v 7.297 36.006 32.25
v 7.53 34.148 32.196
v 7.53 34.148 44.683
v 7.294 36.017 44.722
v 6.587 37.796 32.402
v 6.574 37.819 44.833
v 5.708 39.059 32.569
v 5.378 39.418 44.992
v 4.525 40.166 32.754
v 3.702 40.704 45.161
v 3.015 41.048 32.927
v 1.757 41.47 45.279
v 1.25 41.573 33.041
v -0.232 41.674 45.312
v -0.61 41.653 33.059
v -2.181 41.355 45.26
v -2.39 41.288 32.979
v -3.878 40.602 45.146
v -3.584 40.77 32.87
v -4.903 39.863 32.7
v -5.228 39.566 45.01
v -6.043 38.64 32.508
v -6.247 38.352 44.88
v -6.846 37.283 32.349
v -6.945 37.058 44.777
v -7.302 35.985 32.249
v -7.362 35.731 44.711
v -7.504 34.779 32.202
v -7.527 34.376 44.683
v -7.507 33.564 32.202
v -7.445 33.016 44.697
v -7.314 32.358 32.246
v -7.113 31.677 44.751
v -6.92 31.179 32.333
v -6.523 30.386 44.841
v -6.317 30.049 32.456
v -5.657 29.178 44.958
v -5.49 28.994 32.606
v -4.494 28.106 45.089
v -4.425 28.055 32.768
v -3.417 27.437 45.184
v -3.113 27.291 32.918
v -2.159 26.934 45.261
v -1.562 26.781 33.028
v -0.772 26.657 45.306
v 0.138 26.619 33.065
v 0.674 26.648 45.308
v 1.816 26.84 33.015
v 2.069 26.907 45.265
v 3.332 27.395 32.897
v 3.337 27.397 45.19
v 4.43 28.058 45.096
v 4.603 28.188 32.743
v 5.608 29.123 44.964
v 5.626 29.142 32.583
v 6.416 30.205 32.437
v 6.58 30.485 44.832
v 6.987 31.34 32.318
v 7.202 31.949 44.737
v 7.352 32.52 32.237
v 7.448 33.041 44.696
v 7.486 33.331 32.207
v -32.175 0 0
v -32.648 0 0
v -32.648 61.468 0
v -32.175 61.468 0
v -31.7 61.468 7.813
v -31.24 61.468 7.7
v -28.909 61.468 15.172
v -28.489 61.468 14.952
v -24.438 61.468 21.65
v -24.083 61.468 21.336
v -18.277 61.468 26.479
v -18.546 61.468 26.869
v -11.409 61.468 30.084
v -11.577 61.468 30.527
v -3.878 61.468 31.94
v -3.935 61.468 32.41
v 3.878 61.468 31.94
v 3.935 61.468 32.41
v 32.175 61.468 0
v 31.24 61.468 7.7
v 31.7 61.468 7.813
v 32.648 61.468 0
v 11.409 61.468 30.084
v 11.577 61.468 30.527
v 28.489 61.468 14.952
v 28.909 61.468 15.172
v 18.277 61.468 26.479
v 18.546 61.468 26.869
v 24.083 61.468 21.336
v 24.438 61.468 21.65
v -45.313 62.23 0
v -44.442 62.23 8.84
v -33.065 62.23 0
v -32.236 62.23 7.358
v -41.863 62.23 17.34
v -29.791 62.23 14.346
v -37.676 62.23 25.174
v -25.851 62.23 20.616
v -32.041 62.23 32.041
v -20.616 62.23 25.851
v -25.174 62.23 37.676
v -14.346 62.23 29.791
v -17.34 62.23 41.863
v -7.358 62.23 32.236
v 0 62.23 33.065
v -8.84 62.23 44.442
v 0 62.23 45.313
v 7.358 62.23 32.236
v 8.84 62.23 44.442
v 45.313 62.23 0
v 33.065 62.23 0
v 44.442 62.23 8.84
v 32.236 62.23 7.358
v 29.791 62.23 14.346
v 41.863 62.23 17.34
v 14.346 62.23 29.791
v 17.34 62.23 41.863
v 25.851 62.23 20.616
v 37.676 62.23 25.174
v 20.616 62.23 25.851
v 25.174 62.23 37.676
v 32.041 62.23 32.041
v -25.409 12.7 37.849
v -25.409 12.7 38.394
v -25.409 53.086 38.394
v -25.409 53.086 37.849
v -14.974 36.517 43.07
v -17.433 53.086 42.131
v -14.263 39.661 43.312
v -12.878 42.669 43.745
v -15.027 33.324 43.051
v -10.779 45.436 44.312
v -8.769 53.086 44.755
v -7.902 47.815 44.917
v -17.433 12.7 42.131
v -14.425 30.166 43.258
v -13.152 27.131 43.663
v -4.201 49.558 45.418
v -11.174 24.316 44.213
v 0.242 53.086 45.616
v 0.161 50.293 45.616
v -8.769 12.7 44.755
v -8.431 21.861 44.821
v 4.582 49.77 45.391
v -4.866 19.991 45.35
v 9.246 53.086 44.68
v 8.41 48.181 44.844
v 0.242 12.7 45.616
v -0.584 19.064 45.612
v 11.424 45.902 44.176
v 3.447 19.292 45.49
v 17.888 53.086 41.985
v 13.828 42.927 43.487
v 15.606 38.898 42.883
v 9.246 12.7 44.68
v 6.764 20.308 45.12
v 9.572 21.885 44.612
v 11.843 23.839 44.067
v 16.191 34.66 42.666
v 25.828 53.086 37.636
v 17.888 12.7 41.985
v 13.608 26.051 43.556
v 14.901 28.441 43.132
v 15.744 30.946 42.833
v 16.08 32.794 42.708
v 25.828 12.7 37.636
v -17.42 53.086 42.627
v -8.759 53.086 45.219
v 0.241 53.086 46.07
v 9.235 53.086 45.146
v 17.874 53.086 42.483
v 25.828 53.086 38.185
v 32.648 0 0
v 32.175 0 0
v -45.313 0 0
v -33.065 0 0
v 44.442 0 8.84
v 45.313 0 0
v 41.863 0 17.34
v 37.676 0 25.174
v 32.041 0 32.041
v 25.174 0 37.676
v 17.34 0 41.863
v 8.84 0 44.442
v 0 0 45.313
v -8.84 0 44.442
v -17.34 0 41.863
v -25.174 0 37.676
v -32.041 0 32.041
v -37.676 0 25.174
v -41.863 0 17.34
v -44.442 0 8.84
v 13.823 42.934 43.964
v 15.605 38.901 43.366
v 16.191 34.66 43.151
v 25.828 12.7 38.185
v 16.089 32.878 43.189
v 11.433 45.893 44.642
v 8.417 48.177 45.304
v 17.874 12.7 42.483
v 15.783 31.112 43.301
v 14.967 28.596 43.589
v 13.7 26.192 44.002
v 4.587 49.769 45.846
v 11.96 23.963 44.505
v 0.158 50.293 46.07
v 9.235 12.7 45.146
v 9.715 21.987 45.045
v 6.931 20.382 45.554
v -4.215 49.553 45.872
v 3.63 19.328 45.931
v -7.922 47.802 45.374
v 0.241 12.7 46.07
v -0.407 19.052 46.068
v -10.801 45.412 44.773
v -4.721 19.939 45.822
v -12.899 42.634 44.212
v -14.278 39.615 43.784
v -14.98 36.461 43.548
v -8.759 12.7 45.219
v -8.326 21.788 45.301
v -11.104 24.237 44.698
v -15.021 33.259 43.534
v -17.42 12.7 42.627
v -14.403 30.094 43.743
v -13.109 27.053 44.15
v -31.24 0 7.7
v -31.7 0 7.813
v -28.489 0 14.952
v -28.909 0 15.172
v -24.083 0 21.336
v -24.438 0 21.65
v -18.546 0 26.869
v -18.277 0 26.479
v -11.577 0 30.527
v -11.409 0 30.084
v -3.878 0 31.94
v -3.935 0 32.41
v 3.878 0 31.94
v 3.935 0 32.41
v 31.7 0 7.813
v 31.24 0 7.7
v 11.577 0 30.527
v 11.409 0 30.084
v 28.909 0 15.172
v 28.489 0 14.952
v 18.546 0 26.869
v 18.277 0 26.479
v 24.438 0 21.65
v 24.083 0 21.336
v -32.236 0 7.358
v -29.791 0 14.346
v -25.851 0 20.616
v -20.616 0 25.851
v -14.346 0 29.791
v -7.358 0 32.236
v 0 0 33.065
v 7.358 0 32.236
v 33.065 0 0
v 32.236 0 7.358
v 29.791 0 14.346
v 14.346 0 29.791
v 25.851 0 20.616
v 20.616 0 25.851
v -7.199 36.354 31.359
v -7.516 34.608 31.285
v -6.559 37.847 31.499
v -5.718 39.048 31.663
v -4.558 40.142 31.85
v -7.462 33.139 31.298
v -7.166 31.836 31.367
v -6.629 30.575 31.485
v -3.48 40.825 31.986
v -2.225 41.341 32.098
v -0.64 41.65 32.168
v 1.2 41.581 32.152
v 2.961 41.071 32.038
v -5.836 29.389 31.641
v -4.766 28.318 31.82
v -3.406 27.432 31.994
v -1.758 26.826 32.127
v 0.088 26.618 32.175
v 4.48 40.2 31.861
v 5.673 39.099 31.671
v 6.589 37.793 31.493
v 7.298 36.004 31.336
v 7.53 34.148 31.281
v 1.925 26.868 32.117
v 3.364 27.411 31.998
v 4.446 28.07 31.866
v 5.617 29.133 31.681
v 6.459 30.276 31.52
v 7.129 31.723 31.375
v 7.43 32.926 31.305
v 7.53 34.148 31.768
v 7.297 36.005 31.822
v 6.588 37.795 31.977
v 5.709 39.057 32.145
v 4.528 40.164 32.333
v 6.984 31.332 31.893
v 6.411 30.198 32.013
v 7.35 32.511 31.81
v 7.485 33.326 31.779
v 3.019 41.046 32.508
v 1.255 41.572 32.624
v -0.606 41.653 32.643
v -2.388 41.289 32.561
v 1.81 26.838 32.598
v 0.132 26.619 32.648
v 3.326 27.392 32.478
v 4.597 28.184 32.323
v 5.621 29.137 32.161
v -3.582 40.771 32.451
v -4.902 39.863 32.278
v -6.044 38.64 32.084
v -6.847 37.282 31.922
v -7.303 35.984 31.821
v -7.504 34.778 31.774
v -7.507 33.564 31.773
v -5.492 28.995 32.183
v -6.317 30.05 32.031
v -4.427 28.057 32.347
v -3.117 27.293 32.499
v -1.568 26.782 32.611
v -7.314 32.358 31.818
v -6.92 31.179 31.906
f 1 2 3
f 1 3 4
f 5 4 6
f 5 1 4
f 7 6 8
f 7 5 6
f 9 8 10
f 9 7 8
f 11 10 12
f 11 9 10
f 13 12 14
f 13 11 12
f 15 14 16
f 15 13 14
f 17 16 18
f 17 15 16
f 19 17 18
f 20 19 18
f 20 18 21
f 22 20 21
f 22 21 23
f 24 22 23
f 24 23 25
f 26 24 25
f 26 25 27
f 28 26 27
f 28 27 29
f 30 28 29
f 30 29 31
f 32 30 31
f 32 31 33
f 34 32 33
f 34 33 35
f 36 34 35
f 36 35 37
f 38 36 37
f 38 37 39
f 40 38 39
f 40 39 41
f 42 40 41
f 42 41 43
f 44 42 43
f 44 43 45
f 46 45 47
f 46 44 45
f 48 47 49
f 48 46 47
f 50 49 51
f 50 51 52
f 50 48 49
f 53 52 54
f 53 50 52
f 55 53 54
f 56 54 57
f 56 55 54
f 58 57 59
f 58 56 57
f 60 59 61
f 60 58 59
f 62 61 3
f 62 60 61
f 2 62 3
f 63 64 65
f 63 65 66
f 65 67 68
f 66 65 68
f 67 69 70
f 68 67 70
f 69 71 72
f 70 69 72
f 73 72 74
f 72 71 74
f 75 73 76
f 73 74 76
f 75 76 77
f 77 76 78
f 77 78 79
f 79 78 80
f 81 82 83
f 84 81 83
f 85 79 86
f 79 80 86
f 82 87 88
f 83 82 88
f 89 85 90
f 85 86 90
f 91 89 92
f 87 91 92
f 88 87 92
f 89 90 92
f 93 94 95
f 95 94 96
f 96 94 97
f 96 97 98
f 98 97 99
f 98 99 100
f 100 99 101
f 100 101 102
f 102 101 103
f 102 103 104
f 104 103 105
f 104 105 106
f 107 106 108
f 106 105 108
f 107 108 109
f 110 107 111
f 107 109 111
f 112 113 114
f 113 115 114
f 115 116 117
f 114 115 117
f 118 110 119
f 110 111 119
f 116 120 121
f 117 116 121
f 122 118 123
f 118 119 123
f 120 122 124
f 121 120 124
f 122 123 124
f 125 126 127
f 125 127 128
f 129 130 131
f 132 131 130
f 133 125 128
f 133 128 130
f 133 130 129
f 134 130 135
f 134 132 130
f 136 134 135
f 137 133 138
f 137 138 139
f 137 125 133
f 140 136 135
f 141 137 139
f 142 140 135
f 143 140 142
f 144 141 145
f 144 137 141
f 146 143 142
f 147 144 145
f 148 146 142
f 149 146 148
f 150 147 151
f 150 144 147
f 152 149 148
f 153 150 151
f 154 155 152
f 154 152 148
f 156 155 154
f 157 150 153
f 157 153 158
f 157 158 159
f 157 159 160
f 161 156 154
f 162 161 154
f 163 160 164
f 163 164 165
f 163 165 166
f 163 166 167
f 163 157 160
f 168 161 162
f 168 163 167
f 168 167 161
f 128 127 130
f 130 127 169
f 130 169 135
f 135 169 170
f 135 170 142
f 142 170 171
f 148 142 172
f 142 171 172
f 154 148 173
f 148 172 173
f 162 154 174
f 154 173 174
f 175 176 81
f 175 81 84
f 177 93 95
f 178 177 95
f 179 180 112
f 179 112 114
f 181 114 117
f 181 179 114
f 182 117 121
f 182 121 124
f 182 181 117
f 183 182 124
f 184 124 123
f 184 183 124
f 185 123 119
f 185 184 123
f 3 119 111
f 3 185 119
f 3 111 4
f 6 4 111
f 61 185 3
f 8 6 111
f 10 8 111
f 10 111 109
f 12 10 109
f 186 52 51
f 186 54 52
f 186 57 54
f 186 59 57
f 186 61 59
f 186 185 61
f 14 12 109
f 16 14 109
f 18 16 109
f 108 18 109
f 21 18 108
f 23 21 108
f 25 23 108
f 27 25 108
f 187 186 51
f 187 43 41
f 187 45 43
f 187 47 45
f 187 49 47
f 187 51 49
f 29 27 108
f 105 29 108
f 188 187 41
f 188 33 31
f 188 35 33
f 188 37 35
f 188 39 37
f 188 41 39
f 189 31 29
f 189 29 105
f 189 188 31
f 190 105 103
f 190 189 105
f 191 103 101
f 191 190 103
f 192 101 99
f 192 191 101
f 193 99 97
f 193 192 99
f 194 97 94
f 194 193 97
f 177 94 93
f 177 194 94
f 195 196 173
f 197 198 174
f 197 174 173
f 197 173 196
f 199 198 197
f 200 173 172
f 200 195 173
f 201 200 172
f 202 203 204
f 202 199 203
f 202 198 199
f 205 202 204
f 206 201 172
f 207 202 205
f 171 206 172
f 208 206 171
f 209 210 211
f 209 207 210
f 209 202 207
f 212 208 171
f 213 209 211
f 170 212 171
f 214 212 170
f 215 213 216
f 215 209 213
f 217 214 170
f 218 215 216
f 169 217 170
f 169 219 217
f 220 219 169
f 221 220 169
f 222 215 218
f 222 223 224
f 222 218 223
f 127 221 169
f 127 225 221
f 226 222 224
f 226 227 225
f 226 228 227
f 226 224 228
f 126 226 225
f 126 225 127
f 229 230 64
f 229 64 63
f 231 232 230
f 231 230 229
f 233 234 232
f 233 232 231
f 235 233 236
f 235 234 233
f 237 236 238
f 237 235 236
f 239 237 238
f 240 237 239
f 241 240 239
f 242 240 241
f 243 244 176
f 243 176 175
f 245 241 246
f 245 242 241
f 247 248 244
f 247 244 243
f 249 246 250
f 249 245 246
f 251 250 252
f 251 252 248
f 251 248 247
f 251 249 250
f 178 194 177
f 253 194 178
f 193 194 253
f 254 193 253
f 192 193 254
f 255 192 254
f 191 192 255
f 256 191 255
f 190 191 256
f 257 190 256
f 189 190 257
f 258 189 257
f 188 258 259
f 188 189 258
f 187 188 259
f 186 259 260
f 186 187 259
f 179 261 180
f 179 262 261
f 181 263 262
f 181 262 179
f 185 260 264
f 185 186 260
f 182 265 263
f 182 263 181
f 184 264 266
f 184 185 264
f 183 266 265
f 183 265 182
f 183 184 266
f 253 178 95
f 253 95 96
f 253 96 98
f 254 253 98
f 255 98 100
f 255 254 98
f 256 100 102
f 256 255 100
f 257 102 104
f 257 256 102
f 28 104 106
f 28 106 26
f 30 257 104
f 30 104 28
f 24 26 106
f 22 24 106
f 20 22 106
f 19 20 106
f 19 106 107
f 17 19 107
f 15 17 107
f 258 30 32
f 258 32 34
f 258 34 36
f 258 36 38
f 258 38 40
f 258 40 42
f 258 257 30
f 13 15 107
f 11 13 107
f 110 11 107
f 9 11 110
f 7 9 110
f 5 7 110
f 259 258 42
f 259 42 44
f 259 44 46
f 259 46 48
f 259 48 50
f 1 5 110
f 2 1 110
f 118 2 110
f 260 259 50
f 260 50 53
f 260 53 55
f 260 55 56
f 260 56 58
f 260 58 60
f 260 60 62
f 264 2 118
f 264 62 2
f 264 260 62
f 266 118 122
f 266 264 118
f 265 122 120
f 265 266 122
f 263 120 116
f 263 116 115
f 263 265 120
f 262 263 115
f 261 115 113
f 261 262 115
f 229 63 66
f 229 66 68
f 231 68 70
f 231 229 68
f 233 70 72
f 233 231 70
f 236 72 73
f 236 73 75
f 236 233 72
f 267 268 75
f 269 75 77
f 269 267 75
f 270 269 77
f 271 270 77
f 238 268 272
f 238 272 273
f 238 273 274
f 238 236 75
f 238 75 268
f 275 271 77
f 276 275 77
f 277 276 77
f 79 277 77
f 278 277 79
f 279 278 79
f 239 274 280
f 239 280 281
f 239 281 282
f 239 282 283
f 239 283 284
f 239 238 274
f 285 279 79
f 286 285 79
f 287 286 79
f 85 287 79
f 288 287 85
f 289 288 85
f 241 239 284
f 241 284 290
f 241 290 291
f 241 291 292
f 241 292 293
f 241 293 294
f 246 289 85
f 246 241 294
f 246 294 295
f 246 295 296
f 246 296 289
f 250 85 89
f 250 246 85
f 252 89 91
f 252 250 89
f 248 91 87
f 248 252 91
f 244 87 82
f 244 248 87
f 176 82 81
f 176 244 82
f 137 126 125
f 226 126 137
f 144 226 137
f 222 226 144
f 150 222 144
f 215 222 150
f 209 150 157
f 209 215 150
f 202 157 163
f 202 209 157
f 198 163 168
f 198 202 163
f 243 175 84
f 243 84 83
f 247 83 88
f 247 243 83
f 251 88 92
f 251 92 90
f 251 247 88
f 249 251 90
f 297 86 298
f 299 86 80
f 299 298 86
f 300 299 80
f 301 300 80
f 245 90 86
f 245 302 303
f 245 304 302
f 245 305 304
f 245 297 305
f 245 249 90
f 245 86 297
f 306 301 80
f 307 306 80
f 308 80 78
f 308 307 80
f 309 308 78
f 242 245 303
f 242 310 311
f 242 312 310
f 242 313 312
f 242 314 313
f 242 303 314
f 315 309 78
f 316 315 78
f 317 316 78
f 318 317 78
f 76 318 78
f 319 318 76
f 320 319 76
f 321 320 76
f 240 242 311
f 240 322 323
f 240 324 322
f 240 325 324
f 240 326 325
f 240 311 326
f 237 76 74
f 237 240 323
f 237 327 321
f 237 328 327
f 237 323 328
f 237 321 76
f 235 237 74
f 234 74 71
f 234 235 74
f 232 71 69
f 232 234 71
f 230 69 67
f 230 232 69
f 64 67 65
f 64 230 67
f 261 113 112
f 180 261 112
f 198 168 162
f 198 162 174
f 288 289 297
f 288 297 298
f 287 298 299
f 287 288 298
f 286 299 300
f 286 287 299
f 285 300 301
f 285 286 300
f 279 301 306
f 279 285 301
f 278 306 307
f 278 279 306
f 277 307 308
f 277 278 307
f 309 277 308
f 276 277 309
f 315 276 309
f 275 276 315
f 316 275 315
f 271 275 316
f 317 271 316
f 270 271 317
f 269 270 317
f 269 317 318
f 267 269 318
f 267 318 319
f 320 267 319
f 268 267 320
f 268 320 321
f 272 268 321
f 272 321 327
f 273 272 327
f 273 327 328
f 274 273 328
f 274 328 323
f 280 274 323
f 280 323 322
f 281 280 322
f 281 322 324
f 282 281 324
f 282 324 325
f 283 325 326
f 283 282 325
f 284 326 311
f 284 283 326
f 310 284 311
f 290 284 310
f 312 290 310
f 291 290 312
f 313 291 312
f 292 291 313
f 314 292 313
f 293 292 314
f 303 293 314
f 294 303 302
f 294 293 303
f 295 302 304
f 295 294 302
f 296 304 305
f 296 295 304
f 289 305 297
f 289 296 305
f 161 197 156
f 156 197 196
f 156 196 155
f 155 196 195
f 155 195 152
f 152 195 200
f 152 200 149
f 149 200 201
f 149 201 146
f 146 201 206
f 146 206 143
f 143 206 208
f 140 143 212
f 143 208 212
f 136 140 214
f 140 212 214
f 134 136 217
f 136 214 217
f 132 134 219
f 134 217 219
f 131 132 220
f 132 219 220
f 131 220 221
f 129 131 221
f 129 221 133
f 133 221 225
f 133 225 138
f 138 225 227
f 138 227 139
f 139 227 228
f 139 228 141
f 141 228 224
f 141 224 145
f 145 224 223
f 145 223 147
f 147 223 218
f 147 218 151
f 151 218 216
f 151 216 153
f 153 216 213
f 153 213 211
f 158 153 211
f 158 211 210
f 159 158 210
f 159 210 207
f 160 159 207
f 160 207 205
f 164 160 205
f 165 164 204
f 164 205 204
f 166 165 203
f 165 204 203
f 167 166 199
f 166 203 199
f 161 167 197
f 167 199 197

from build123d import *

# Parameters (mm, degrees)
F1_DEPTH  = 62.23
F5_DEPTH  = 40.386
F7_R      = 15.6378142811
F8_DEPTH  = 5.9182
F10_DEPTH = 61.468
F2_R      = 7.5300528798
F11_DEPTH = 61.214


with BuildPart() as f1:
    # F0 (on Front) → F1 (new body)
    with BuildSketch(Plane.XZ):
        with BuildLine():
            Line((33.065059418, 0), (45.3126704294, 0))
            ThreePointArc((45.3126704294, 0), (0, 45.3126704294), (-45.3126704294, 0))
            Line((-45.3126704294, 0), (-33.065059418, 0))
            ThreePointArc((-33.065059418, 0), (0, 33.065059418), (33.065059418, 0))
        make_face()
    extrude(amount=-F1_DEPTH)


with BuildPart() as f5:
    # F4 (on offset) → F5 (new body)
    with BuildSketch(Plane.XZ.offset(-12.7)):
        with BuildLine():
            Line((-25.4087150097, 38.3940178116), (-25.4087150097, 37.8486377124))
            ThreePointArc((-25.4087150097, 37.8486377124), (0.2421673779, 45.6160268954), (25.8278329857, 37.6364393506))
            Line((25.8278329857, 37.6364393506), (25.8278329857, 38.1848504555))
            ThreePointArc((25.8278329857, 38.1848504555), (0.2413204096, 46.0695468195), (-25.4087150097, 38.3940178116))
        make_face()
    extrude(amount=-F5_DEPTH)

    # F7 (on offset) → F8 (cut)
    with BuildSketch(Plane.XY.offset(48.514)):
        with Locations((0.5534864613, 34.6601381898)):
            Circle(F7_R)
    extrude(amount=-F8_DEPTH, mode=Mode.SUBTRACT)


with BuildPart() as f10:
    # F9 (on Front) → F10 (new body)
    with BuildSketch(Plane.XZ):
        with BuildLine():
            ThreePointArc((-32.1748587606, 0), (0, 32.1748587606), (32.1748587606, 0))
            Line((32.1748587606, 0), (32.6482600665, 0))
            ThreePointArc((32.6482600665, 0), (0, 32.6482600665), (-32.6482600665, 0))
            Line((-32.6482600665, 0), (-32.1748587606, 0))
        make_face()
    extrude(amount=-F10_DEPTH)


with BuildPart() as f11_tool:
    # F2 (on Top) → F11 (new body)
    with BuildSketch(Plane.XY):
        with Locations((0, 34.14754197)):
            Circle(F2_R)
    extrude(amount=F11_DEPTH)


with BuildPart() as f1_1:
    add(f1.part)

    # F11: cut by f11_tool
    add(f11_tool.part, mode=Mode.SUBTRACT)


with BuildPart() as f10_1:
    add(f10.part)

    # F11: cut by f11_tool
    add(f11_tool.part, mode=Mode.SUBTRACT)


solid = Compound([f5.part, f1_1.part, f10_1.part])
